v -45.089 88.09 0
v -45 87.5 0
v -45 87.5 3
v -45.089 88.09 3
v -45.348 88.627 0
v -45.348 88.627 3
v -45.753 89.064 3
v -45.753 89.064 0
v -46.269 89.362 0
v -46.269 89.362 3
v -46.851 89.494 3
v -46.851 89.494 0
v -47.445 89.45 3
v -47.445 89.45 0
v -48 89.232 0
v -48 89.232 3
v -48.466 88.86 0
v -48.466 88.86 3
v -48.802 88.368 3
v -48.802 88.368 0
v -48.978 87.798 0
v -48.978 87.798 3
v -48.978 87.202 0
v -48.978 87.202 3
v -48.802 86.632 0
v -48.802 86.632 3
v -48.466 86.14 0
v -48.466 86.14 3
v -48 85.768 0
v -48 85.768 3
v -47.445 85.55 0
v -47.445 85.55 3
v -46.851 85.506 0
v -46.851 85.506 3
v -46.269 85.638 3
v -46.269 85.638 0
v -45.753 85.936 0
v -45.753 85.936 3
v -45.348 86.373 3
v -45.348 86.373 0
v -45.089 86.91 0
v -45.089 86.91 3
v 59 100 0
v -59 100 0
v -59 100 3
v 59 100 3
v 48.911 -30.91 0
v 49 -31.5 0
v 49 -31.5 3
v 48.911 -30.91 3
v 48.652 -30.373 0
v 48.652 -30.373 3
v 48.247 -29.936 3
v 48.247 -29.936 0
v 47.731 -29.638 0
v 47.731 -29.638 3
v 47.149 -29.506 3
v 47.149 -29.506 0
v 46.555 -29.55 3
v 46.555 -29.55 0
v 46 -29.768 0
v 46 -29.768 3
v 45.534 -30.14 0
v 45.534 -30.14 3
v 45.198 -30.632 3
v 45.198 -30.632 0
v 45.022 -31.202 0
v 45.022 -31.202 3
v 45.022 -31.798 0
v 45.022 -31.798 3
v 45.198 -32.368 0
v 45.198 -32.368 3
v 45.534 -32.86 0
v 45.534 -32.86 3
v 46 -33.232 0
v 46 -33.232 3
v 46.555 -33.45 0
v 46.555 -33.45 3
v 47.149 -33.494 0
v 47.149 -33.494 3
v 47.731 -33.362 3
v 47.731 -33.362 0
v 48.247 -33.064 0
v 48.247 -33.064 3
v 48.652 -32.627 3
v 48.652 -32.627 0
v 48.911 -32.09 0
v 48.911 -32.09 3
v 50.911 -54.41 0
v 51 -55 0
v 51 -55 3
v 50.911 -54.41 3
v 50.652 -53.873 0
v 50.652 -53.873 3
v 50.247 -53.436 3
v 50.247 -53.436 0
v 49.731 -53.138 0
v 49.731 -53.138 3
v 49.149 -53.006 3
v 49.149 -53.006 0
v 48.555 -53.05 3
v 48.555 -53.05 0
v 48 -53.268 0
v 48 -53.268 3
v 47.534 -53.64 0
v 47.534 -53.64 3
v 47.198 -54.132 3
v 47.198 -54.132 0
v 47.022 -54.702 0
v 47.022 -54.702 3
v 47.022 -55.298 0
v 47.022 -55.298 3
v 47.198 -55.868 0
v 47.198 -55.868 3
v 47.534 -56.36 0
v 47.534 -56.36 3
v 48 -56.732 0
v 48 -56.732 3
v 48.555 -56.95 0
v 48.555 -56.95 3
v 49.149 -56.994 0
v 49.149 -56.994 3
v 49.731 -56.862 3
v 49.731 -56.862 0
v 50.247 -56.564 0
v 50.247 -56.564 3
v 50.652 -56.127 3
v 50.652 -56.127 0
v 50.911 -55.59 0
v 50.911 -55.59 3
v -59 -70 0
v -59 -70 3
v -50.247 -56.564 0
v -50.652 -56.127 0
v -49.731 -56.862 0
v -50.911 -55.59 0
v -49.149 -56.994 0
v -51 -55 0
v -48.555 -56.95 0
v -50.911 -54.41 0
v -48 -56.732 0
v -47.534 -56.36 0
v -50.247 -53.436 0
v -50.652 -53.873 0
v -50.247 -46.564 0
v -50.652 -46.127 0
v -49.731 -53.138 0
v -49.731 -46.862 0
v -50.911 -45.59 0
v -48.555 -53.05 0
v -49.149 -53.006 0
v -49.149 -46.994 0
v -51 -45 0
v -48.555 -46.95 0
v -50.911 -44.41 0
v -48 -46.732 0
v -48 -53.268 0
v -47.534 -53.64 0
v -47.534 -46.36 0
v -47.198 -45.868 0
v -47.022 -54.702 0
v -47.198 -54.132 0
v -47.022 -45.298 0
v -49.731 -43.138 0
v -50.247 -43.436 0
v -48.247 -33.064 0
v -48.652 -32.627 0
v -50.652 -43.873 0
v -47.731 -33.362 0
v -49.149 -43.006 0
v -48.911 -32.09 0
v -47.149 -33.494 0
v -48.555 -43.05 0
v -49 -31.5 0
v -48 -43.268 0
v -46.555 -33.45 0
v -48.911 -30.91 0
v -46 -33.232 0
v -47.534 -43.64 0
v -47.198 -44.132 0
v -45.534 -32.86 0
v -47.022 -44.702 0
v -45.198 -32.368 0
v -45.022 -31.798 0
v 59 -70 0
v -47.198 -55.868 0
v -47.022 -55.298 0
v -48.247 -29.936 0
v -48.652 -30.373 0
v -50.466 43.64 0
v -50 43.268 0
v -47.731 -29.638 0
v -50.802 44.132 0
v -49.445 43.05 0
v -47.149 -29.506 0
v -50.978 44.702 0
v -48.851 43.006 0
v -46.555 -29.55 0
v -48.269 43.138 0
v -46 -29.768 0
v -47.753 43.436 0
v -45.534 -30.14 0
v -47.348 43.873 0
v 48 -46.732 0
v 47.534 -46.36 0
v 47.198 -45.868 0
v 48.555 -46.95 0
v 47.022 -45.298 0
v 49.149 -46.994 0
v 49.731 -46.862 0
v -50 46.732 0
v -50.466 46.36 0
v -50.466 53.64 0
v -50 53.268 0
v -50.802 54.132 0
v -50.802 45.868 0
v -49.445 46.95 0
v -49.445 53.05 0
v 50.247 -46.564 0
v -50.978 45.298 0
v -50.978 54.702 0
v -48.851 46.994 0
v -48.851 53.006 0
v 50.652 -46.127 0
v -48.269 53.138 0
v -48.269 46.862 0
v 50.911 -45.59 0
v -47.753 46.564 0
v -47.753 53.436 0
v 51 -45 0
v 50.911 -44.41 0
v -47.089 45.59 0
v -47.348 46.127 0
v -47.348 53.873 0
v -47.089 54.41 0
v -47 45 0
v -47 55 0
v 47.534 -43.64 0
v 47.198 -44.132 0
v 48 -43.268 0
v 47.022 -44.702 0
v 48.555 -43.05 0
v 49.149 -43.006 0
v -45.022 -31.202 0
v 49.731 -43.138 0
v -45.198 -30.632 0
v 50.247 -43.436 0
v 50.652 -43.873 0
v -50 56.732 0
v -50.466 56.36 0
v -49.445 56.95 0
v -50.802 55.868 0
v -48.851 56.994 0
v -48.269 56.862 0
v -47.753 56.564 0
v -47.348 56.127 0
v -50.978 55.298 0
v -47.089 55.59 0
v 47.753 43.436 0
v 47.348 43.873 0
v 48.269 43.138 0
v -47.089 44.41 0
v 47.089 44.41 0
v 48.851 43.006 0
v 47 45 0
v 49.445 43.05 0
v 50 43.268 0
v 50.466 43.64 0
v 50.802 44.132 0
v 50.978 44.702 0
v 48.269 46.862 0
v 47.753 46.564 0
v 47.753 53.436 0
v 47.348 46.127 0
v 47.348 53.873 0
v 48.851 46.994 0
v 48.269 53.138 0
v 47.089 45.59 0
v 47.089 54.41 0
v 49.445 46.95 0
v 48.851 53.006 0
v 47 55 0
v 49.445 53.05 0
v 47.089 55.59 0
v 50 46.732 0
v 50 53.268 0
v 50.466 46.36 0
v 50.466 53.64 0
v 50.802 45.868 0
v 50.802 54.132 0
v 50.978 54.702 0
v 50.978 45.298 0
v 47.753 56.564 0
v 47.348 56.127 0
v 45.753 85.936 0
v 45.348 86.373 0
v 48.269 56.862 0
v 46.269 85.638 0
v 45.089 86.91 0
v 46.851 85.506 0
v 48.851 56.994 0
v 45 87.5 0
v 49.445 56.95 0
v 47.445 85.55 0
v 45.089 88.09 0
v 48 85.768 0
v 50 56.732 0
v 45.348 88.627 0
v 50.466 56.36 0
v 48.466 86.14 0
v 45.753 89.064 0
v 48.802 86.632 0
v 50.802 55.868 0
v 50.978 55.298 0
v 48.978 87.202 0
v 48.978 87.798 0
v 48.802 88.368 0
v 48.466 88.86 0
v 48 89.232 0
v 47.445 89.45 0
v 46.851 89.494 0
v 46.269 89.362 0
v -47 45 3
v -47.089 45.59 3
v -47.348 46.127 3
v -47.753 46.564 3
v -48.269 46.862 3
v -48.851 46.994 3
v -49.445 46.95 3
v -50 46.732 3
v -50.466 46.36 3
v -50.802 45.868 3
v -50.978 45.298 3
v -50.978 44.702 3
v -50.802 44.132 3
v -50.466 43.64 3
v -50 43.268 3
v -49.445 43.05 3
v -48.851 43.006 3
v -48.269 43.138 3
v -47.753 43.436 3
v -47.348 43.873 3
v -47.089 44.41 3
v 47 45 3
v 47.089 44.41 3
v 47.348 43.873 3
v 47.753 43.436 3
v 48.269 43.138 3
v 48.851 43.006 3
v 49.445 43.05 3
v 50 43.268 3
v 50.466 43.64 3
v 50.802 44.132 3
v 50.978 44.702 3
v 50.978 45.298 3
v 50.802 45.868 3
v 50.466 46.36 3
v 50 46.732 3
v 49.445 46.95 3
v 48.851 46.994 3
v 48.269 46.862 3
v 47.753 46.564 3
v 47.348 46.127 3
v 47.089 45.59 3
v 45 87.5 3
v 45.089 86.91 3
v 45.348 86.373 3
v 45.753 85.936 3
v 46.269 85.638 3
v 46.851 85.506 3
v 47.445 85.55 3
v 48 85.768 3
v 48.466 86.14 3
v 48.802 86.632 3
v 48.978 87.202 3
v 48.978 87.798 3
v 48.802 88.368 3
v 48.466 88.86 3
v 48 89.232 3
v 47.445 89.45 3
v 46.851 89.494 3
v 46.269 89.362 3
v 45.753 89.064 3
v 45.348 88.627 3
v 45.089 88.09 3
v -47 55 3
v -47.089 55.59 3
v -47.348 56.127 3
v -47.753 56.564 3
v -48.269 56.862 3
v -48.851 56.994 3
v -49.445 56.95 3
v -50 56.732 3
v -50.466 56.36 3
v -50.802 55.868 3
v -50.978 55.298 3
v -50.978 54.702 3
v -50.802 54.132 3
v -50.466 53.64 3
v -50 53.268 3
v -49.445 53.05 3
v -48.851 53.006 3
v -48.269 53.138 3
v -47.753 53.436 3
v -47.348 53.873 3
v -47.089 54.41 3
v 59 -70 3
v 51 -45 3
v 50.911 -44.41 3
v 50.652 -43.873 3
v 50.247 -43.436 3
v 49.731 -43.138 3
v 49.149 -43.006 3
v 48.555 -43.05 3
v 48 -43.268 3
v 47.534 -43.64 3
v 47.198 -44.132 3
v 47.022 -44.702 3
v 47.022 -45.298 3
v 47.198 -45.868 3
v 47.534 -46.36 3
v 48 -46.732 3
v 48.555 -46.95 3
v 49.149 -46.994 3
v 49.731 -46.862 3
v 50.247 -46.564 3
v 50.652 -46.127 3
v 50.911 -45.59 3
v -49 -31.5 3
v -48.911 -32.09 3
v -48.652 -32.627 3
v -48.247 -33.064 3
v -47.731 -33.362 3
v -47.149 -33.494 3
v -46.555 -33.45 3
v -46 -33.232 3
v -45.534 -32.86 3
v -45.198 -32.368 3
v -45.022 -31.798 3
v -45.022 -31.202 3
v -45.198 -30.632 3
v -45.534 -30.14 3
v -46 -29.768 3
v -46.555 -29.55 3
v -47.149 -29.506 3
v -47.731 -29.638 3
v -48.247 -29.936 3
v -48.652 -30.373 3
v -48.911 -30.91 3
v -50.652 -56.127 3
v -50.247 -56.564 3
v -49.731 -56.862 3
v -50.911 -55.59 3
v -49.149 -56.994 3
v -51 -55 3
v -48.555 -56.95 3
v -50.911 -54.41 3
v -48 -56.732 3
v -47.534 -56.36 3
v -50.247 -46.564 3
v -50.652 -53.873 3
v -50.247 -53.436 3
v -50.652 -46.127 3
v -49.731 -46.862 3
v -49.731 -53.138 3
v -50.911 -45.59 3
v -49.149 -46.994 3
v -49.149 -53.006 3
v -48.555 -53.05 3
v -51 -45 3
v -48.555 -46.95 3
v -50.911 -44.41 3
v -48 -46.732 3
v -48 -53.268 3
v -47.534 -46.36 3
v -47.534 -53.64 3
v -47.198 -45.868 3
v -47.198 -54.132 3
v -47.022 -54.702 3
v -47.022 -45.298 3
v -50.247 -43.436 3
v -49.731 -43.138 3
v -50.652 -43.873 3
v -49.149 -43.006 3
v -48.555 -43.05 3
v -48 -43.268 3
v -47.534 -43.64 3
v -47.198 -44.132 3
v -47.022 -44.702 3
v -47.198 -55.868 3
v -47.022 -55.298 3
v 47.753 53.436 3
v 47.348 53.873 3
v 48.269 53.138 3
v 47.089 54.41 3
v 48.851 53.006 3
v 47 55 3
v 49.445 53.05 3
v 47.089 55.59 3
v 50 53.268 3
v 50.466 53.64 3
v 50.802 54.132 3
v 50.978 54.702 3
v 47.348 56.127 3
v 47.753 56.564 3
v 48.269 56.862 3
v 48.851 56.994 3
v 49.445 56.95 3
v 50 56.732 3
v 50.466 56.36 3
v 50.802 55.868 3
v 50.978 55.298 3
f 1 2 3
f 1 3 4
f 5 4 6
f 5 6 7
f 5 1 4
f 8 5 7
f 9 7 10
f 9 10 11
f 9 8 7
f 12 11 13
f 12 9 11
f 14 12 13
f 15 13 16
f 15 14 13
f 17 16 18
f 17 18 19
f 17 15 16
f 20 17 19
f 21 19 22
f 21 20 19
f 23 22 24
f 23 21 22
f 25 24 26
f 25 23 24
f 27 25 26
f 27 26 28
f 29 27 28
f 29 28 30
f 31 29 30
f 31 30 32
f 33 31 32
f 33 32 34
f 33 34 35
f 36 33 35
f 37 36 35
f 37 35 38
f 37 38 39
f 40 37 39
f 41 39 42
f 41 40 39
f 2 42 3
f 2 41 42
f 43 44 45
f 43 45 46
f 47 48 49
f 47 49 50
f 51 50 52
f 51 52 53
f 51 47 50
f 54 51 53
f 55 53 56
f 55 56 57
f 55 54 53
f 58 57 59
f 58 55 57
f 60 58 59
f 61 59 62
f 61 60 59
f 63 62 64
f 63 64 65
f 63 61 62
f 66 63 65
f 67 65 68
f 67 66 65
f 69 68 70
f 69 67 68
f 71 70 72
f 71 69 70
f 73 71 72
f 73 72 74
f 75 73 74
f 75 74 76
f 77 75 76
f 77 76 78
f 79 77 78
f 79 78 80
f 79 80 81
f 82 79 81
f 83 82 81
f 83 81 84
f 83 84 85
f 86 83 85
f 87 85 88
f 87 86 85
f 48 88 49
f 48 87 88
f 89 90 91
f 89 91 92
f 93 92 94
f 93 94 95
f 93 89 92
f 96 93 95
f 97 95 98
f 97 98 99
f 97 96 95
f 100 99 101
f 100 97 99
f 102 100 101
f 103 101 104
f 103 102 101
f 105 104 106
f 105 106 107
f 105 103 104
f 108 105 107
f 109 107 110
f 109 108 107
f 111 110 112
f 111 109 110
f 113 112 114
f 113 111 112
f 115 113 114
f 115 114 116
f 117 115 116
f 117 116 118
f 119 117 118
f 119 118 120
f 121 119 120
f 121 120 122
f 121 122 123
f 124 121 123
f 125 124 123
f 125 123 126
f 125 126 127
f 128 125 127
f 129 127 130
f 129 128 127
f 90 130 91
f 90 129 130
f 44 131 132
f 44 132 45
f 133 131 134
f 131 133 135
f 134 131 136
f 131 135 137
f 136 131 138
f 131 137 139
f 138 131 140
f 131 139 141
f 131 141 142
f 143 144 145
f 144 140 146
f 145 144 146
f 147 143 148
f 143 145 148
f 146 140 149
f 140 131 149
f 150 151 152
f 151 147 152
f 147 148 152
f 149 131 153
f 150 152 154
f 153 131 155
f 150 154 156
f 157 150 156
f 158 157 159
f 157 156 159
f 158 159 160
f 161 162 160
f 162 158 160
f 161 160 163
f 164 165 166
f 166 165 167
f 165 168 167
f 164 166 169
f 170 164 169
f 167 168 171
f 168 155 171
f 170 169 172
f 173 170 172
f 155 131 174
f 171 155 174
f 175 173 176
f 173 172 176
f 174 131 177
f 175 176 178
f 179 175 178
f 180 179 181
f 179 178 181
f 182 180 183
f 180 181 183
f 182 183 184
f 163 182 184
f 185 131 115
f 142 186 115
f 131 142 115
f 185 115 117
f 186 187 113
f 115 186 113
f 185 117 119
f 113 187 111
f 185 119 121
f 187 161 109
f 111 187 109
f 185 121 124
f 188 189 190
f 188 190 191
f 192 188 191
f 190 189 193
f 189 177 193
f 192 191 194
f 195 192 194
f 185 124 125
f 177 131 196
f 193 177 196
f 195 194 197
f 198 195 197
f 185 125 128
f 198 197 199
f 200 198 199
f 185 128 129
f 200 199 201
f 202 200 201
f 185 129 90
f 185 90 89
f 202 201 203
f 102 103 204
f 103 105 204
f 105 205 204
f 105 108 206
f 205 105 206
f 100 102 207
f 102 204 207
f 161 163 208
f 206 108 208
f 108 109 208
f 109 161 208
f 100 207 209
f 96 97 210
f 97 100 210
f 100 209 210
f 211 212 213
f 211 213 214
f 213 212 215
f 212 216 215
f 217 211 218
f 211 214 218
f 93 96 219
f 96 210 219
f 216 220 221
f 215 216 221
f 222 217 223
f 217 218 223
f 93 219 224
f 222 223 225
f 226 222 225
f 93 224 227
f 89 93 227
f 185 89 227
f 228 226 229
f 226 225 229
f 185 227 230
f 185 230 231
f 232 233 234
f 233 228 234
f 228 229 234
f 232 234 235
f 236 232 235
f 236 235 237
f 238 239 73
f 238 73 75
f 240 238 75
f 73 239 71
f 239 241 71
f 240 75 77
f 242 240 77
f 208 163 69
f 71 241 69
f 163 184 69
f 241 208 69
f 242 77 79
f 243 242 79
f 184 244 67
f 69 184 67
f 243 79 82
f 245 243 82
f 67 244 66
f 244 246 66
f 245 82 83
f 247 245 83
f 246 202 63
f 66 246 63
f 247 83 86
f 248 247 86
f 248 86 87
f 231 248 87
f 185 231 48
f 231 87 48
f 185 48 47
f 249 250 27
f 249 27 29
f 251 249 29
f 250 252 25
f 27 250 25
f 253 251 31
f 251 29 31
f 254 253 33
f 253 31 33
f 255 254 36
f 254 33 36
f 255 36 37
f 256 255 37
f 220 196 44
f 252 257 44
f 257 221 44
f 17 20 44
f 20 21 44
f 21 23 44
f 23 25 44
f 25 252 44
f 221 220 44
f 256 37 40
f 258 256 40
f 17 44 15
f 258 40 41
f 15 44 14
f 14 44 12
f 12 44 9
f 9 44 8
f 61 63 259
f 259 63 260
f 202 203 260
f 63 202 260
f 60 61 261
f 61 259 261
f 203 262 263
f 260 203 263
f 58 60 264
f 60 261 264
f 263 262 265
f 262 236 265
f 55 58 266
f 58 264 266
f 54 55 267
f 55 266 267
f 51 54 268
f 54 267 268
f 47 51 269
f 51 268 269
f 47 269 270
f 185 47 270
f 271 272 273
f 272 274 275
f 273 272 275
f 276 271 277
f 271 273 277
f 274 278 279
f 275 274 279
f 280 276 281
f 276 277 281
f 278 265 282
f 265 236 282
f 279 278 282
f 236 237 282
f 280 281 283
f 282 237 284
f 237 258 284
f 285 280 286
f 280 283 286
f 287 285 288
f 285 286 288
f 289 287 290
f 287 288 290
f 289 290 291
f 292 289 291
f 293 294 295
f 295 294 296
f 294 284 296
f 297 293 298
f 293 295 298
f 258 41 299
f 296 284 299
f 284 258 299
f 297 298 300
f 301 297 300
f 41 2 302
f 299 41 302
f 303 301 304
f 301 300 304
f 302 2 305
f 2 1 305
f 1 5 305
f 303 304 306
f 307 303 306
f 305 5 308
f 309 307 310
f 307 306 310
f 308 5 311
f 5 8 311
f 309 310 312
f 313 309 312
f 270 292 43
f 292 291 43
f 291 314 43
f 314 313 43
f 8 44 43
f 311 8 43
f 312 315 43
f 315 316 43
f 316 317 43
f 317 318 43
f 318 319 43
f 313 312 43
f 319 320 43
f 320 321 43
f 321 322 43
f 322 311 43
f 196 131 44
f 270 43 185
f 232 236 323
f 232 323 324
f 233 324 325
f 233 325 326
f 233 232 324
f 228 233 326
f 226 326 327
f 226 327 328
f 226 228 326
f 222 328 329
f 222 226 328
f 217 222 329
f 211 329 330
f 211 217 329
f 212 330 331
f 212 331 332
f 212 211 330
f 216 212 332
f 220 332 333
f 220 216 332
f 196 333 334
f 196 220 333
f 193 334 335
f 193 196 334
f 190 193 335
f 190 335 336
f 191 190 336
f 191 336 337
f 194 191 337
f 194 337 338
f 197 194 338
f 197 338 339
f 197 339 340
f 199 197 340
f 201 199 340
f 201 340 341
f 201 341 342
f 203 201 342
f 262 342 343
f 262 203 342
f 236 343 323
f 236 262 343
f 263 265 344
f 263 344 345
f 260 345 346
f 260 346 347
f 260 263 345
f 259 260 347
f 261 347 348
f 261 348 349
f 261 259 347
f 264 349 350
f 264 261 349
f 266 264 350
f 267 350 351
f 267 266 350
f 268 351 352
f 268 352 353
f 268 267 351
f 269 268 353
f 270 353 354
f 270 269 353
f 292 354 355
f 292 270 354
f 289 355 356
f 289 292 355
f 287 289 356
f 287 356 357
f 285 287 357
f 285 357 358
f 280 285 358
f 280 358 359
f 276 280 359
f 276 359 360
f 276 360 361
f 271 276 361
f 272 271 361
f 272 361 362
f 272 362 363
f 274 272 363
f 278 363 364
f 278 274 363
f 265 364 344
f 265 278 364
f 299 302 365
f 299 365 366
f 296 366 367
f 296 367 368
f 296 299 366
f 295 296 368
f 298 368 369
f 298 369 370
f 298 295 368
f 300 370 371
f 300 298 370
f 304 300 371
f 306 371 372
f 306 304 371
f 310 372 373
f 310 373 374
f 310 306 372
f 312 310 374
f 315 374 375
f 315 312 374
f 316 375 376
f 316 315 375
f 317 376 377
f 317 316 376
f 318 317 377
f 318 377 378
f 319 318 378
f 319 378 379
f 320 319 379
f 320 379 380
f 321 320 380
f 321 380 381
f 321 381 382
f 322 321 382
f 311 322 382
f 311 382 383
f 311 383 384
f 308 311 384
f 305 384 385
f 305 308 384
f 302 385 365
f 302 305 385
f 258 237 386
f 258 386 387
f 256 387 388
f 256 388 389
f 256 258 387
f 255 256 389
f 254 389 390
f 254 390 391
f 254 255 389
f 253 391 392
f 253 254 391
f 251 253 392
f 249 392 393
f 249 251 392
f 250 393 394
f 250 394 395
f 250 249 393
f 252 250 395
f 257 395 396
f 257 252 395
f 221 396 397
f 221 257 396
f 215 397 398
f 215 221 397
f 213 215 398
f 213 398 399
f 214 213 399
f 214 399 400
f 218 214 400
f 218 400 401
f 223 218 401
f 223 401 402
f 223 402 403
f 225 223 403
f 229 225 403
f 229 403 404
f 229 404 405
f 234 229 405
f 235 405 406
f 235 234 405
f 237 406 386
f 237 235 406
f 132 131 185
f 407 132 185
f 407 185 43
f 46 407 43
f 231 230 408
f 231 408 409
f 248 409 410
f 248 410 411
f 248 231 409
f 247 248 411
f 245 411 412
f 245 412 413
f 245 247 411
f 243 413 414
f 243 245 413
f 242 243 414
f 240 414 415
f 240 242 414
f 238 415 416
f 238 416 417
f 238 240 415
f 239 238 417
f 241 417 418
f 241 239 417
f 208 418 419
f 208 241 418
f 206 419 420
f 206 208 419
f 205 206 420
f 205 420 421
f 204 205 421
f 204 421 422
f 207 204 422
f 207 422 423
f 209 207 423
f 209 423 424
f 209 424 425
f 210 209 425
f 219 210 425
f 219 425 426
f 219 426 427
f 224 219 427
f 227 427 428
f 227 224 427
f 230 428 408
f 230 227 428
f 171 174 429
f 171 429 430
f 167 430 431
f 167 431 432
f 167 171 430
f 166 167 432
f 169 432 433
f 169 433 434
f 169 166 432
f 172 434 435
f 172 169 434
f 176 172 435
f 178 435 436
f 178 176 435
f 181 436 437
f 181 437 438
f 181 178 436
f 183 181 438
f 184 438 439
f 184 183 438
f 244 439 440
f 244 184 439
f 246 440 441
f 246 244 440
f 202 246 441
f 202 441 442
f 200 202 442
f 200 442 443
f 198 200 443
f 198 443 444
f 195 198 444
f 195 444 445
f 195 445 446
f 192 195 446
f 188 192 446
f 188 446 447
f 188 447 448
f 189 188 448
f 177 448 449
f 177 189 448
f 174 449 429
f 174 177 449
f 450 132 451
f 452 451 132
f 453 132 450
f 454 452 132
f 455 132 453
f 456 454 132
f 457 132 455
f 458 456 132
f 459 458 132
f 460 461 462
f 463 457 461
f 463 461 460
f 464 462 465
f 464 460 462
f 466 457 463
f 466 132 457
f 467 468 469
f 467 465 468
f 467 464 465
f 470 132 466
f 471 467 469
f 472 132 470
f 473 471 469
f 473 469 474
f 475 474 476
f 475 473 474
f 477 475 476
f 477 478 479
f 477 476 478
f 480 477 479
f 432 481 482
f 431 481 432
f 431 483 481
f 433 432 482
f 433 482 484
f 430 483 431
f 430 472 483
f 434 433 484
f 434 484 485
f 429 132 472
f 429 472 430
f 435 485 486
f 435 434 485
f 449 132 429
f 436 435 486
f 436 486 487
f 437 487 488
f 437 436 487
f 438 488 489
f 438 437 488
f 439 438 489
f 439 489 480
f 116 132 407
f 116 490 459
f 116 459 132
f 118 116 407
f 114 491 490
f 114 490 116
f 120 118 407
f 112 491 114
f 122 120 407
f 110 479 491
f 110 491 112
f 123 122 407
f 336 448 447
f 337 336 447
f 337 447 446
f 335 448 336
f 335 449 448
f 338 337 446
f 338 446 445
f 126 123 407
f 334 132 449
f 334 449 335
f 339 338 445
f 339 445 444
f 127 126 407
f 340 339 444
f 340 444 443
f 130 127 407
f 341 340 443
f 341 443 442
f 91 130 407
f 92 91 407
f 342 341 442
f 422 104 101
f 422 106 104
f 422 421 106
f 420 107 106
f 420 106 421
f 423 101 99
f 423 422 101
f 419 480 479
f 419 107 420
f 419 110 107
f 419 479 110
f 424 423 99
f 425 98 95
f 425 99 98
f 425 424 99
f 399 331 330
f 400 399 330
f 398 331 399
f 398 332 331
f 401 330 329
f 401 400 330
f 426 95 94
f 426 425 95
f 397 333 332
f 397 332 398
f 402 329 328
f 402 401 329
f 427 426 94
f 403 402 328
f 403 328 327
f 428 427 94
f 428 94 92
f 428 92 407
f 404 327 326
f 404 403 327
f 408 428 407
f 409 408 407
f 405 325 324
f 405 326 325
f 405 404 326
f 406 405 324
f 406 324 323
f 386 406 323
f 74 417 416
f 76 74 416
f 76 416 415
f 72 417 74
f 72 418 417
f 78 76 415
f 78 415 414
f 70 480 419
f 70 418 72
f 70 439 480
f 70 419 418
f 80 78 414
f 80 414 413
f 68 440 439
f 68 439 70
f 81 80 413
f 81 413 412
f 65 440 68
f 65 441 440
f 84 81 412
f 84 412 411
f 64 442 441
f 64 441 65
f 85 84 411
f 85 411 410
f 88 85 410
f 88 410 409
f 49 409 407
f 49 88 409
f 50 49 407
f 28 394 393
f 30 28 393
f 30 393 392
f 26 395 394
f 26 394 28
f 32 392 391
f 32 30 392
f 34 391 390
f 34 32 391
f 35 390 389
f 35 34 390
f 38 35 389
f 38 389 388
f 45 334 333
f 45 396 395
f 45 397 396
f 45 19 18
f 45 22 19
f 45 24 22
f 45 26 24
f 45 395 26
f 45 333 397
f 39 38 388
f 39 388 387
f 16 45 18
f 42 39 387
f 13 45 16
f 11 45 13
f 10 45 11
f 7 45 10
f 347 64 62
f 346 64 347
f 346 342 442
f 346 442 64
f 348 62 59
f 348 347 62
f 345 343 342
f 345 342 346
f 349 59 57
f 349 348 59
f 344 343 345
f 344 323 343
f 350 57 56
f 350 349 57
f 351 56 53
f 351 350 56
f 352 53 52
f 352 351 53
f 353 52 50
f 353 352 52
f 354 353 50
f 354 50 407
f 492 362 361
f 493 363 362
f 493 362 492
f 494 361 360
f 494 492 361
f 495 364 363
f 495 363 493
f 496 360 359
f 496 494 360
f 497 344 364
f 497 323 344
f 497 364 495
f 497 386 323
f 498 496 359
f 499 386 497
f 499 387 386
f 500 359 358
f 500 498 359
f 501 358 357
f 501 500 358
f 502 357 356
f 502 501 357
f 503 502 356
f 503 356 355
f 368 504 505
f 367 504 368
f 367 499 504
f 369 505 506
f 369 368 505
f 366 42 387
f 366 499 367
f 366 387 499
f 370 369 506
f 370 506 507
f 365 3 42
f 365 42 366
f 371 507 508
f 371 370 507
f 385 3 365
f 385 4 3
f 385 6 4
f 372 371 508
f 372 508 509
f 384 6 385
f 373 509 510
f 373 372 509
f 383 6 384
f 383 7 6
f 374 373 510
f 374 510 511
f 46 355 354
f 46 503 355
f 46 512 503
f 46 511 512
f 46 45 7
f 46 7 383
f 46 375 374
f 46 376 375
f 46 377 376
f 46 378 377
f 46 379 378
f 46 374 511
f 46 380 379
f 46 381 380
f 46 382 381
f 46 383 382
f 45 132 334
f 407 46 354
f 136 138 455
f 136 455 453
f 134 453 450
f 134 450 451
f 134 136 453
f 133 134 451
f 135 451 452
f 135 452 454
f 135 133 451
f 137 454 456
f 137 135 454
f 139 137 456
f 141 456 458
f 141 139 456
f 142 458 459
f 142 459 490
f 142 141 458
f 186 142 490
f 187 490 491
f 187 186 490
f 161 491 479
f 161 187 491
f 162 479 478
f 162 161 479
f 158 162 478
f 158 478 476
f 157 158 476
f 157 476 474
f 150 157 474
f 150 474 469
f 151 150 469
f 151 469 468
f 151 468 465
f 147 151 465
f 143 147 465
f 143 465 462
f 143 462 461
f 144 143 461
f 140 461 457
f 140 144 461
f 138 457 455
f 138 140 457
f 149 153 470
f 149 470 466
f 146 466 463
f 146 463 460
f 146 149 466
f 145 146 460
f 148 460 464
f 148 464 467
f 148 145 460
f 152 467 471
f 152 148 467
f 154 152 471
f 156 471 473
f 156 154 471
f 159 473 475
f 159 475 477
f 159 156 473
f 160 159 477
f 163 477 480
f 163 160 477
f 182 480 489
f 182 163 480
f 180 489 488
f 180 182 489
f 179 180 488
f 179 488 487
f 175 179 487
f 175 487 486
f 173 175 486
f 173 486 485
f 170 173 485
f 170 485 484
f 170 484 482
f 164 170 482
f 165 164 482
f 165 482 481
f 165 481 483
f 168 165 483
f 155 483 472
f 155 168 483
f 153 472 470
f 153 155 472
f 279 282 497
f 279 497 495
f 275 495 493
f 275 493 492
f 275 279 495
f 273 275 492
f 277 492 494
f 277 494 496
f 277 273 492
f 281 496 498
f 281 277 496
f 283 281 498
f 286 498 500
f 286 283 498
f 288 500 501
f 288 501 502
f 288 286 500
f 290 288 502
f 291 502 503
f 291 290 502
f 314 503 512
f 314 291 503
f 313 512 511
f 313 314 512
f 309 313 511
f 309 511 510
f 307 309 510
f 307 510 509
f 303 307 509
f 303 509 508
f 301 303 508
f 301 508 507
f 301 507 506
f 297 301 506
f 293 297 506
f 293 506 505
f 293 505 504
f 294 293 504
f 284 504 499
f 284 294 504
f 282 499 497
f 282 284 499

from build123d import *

# Parameters (mm, degrees)
SKETCH_1_W      = 118
SKETCH_1_H      = 170
SKETCH_1_R      = 2
EXTRUDE_1_DEPTH = 3


with BuildPart() as part:
    # 草图1 → 凸台-拉伸1 (new body)
    with BuildSketch(Plane.XY):
        with Locations((0, 15)):
            Rectangle(SKETCH_1_W, SKETCH_1_H)
        with Locations((-49, 55)):
            Circle(SKETCH_1_R, mode=Mode.SUBTRACT)
        with Locations((-49, 45)):
            Circle(SKETCH_1_R, mode=Mode.SUBTRACT)
        with Locations(Location((49, 45, 0), (0, 0, 180))):
            Circle(SKETCH_1_R, mode=Mode.SUBTRACT)
        with Locations(Location((49, 55, 0), (0, 0, 180))):
            Circle(SKETCH_1_R, mode=Mode.SUBTRACT)
        with Locations((49, -45)):
            Circle(SKETCH_1_R, mode=Mode.SUBTRACT)
        with Locations((49, -55)):
            Circle(SKETCH_1_R, mode=Mode.SUBTRACT)
        with Locations(Location((-49, -45, 0), (0, 0, 180))):
            Circle(SKETCH_1_R, mode=Mode.SUBTRACT)
        with Locations(Location((-49, -55, 0), (0, 0, 180))):
            Circle(SKETCH_1_R, mode=Mode.SUBTRACT)
        with Locations((-47, 87.5)):
            Circle(SKETCH_1_R, mode=Mode.SUBTRACT)
        with Locations(Location((47, 87.5, 0), (0, 0, 180))):
            Circle(SKETCH_1_R, mode=Mode.SUBTRACT)
        with Locations((47, -31.5)):
            Circle(SKETCH_1_R, mode=Mode.SUBTRACT)
        with Locations(Location((-47, -31.5, 0), (0, 0, 180))):
            Circle(SKETCH_1_R, mode=Mode.SUBTRACT)
    extrude(amount=EXTRUDE_1_DEPTH)


solid = part.part
